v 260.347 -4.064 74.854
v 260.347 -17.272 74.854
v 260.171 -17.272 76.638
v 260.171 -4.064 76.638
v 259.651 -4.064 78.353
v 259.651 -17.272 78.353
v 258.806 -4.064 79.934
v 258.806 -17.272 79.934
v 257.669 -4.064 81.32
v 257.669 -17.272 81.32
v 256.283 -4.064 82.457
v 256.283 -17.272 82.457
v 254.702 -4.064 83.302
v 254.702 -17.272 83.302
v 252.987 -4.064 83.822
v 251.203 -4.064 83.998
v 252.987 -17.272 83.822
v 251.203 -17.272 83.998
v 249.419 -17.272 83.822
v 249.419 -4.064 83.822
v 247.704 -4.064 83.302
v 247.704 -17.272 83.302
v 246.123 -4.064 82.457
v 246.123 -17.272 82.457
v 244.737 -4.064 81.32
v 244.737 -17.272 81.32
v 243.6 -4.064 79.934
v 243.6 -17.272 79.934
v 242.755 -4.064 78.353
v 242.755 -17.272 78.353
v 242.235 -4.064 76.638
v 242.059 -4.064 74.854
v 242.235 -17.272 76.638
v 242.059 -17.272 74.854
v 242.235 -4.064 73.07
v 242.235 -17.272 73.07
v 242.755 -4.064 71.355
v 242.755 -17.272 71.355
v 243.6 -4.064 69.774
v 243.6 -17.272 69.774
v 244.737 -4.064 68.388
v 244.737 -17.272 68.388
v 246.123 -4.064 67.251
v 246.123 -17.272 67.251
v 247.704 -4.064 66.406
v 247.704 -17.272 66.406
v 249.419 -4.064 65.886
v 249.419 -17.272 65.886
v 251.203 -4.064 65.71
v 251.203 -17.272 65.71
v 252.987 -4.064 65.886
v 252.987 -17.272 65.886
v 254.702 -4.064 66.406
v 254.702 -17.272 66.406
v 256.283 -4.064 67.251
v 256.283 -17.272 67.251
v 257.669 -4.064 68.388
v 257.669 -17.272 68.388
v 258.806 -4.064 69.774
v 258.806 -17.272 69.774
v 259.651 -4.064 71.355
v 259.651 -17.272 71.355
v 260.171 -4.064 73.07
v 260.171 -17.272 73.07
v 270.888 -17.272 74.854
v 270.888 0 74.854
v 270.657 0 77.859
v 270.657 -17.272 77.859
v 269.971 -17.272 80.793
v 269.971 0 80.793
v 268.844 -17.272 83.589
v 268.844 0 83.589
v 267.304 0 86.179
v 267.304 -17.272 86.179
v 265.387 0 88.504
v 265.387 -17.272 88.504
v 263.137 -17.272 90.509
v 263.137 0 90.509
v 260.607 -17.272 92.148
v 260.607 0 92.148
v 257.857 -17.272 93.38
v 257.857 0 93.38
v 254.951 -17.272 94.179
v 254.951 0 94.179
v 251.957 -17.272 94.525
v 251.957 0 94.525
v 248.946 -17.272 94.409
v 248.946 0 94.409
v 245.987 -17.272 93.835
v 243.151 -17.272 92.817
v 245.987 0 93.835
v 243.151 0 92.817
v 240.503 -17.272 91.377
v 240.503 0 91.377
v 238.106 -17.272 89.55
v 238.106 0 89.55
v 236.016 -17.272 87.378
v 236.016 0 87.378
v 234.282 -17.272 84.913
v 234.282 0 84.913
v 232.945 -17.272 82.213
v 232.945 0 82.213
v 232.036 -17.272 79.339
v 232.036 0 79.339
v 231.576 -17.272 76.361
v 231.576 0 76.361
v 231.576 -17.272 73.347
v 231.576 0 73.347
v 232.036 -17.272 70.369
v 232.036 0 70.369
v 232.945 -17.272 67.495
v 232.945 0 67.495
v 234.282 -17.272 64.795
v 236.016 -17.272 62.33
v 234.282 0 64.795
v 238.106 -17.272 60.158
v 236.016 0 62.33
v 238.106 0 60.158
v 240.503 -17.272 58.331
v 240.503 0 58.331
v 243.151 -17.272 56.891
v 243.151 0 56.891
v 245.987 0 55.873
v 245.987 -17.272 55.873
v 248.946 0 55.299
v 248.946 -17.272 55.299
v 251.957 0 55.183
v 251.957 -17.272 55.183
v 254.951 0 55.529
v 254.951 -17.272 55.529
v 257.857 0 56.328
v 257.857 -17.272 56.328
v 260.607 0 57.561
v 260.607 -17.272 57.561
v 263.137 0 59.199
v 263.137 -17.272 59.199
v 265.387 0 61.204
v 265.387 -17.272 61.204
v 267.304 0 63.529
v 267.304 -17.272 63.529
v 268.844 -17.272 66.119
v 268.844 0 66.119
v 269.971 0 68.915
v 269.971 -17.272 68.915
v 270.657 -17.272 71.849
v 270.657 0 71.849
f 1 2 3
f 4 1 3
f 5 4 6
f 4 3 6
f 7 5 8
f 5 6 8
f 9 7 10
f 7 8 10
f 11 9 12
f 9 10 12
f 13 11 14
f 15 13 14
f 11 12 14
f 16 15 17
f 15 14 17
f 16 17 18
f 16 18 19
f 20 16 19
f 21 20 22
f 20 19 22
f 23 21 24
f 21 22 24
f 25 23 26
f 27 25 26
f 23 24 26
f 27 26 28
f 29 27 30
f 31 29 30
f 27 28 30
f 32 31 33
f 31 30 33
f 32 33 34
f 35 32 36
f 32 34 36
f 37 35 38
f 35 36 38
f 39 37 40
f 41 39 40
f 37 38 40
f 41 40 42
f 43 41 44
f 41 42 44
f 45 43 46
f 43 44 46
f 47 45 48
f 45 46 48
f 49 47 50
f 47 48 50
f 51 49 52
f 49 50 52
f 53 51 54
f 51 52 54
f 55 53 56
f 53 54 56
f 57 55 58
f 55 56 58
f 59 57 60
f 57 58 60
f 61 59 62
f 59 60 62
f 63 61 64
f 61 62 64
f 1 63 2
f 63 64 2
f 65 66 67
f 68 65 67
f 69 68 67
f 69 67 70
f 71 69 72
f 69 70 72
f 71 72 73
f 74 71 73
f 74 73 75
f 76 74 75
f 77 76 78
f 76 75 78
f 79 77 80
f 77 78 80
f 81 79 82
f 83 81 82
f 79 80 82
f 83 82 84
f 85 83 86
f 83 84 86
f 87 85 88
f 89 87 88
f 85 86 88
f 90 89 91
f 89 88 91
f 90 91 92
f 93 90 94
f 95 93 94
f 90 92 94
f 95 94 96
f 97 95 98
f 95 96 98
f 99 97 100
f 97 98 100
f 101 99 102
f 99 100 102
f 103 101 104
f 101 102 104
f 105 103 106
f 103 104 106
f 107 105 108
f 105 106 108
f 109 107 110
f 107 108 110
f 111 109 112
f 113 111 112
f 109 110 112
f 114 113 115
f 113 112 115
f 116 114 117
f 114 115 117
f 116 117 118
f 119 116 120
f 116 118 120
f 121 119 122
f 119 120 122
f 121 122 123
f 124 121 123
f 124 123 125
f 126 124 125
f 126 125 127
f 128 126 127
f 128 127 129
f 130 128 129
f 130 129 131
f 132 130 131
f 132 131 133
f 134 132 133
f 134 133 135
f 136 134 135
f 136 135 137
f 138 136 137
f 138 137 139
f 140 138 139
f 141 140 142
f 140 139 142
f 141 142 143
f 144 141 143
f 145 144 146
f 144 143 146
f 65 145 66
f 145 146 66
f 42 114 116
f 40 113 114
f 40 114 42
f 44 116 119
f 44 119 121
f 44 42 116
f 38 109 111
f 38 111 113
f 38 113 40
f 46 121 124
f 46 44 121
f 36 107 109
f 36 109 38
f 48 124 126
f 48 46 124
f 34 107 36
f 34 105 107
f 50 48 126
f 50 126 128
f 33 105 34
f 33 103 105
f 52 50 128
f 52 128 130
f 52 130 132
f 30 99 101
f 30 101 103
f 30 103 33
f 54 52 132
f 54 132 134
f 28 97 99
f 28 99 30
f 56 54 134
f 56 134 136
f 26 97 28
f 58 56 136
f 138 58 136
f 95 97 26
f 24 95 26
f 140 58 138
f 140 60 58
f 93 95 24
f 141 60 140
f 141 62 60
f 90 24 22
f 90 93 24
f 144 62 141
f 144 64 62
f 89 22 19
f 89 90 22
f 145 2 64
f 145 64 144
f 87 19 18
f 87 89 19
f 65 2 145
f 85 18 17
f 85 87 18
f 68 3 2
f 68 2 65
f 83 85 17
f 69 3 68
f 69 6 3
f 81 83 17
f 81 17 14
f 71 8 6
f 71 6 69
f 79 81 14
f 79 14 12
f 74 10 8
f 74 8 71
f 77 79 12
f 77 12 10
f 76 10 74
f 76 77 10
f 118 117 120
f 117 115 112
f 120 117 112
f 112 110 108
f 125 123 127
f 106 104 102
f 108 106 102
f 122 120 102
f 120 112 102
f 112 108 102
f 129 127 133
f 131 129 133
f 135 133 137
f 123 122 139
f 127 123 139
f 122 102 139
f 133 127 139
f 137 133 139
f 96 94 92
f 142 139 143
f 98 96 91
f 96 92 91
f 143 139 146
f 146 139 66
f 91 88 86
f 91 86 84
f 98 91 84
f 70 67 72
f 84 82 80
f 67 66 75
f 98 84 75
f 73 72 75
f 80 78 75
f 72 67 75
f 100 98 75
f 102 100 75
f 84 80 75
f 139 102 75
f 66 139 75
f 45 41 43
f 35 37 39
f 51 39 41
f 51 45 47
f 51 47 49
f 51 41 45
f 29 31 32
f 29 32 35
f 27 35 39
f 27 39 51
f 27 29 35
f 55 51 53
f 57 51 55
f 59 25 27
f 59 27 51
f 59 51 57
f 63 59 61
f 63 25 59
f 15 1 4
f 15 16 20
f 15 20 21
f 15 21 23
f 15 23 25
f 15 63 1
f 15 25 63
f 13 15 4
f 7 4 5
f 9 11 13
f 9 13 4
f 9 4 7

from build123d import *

# Parameters (mm, degrees)
F0_R     = 19.685
F1_DEPTH = 17.272
F2_R     = 9.144
F3_DEPTH = 13.208
F4_R     = 1.999421
F5_DEPTH = 25.4


with BuildPart() as f1:
    # F0 (on Front) → F1 (new body)
    with BuildSketch(Plane.XZ):
        with Locations((251.20312, 74.854024)):
            Circle(F0_R)
    extrude(amount=F1_DEPTH)

    # F2 (on face) → F3 (cut)
    with BuildSketch(Plane.XZ.offset(17.272)):
        with Locations((251.20312, 74.854024)):
            Circle(F2_R)
    extrude(amount=-F3_DEPTH, mode=Mode.SUBTRACT)

    # F4 (on face) → F5 (cut)
    with BuildSketch(Plane.XZ.offset(4.064)):
        with Locations((125.80603, 237.004958)):
            Circle(F4_R)
        with Locations((-78.629516, 256.54611)):
            Circle(F4_R)
        with Locations((-237.004958, 125.80603)):
            Circle(F4_R)
        with Locations((-256.54611, -78.629516)):
            Circle(F4_R)
        with Locations((-125.80603, -237.004958)):
            Circle(F4_R)
        with Locations((78.629516, -256.54611)):
            Circle(F4_R)
        with Locations((237.004958, -125.80603)):
            Circle(F4_R)
    extrude(amount=-F5_DEPTH, mode=Mode.SUBTRACT)


solid = f1.part
